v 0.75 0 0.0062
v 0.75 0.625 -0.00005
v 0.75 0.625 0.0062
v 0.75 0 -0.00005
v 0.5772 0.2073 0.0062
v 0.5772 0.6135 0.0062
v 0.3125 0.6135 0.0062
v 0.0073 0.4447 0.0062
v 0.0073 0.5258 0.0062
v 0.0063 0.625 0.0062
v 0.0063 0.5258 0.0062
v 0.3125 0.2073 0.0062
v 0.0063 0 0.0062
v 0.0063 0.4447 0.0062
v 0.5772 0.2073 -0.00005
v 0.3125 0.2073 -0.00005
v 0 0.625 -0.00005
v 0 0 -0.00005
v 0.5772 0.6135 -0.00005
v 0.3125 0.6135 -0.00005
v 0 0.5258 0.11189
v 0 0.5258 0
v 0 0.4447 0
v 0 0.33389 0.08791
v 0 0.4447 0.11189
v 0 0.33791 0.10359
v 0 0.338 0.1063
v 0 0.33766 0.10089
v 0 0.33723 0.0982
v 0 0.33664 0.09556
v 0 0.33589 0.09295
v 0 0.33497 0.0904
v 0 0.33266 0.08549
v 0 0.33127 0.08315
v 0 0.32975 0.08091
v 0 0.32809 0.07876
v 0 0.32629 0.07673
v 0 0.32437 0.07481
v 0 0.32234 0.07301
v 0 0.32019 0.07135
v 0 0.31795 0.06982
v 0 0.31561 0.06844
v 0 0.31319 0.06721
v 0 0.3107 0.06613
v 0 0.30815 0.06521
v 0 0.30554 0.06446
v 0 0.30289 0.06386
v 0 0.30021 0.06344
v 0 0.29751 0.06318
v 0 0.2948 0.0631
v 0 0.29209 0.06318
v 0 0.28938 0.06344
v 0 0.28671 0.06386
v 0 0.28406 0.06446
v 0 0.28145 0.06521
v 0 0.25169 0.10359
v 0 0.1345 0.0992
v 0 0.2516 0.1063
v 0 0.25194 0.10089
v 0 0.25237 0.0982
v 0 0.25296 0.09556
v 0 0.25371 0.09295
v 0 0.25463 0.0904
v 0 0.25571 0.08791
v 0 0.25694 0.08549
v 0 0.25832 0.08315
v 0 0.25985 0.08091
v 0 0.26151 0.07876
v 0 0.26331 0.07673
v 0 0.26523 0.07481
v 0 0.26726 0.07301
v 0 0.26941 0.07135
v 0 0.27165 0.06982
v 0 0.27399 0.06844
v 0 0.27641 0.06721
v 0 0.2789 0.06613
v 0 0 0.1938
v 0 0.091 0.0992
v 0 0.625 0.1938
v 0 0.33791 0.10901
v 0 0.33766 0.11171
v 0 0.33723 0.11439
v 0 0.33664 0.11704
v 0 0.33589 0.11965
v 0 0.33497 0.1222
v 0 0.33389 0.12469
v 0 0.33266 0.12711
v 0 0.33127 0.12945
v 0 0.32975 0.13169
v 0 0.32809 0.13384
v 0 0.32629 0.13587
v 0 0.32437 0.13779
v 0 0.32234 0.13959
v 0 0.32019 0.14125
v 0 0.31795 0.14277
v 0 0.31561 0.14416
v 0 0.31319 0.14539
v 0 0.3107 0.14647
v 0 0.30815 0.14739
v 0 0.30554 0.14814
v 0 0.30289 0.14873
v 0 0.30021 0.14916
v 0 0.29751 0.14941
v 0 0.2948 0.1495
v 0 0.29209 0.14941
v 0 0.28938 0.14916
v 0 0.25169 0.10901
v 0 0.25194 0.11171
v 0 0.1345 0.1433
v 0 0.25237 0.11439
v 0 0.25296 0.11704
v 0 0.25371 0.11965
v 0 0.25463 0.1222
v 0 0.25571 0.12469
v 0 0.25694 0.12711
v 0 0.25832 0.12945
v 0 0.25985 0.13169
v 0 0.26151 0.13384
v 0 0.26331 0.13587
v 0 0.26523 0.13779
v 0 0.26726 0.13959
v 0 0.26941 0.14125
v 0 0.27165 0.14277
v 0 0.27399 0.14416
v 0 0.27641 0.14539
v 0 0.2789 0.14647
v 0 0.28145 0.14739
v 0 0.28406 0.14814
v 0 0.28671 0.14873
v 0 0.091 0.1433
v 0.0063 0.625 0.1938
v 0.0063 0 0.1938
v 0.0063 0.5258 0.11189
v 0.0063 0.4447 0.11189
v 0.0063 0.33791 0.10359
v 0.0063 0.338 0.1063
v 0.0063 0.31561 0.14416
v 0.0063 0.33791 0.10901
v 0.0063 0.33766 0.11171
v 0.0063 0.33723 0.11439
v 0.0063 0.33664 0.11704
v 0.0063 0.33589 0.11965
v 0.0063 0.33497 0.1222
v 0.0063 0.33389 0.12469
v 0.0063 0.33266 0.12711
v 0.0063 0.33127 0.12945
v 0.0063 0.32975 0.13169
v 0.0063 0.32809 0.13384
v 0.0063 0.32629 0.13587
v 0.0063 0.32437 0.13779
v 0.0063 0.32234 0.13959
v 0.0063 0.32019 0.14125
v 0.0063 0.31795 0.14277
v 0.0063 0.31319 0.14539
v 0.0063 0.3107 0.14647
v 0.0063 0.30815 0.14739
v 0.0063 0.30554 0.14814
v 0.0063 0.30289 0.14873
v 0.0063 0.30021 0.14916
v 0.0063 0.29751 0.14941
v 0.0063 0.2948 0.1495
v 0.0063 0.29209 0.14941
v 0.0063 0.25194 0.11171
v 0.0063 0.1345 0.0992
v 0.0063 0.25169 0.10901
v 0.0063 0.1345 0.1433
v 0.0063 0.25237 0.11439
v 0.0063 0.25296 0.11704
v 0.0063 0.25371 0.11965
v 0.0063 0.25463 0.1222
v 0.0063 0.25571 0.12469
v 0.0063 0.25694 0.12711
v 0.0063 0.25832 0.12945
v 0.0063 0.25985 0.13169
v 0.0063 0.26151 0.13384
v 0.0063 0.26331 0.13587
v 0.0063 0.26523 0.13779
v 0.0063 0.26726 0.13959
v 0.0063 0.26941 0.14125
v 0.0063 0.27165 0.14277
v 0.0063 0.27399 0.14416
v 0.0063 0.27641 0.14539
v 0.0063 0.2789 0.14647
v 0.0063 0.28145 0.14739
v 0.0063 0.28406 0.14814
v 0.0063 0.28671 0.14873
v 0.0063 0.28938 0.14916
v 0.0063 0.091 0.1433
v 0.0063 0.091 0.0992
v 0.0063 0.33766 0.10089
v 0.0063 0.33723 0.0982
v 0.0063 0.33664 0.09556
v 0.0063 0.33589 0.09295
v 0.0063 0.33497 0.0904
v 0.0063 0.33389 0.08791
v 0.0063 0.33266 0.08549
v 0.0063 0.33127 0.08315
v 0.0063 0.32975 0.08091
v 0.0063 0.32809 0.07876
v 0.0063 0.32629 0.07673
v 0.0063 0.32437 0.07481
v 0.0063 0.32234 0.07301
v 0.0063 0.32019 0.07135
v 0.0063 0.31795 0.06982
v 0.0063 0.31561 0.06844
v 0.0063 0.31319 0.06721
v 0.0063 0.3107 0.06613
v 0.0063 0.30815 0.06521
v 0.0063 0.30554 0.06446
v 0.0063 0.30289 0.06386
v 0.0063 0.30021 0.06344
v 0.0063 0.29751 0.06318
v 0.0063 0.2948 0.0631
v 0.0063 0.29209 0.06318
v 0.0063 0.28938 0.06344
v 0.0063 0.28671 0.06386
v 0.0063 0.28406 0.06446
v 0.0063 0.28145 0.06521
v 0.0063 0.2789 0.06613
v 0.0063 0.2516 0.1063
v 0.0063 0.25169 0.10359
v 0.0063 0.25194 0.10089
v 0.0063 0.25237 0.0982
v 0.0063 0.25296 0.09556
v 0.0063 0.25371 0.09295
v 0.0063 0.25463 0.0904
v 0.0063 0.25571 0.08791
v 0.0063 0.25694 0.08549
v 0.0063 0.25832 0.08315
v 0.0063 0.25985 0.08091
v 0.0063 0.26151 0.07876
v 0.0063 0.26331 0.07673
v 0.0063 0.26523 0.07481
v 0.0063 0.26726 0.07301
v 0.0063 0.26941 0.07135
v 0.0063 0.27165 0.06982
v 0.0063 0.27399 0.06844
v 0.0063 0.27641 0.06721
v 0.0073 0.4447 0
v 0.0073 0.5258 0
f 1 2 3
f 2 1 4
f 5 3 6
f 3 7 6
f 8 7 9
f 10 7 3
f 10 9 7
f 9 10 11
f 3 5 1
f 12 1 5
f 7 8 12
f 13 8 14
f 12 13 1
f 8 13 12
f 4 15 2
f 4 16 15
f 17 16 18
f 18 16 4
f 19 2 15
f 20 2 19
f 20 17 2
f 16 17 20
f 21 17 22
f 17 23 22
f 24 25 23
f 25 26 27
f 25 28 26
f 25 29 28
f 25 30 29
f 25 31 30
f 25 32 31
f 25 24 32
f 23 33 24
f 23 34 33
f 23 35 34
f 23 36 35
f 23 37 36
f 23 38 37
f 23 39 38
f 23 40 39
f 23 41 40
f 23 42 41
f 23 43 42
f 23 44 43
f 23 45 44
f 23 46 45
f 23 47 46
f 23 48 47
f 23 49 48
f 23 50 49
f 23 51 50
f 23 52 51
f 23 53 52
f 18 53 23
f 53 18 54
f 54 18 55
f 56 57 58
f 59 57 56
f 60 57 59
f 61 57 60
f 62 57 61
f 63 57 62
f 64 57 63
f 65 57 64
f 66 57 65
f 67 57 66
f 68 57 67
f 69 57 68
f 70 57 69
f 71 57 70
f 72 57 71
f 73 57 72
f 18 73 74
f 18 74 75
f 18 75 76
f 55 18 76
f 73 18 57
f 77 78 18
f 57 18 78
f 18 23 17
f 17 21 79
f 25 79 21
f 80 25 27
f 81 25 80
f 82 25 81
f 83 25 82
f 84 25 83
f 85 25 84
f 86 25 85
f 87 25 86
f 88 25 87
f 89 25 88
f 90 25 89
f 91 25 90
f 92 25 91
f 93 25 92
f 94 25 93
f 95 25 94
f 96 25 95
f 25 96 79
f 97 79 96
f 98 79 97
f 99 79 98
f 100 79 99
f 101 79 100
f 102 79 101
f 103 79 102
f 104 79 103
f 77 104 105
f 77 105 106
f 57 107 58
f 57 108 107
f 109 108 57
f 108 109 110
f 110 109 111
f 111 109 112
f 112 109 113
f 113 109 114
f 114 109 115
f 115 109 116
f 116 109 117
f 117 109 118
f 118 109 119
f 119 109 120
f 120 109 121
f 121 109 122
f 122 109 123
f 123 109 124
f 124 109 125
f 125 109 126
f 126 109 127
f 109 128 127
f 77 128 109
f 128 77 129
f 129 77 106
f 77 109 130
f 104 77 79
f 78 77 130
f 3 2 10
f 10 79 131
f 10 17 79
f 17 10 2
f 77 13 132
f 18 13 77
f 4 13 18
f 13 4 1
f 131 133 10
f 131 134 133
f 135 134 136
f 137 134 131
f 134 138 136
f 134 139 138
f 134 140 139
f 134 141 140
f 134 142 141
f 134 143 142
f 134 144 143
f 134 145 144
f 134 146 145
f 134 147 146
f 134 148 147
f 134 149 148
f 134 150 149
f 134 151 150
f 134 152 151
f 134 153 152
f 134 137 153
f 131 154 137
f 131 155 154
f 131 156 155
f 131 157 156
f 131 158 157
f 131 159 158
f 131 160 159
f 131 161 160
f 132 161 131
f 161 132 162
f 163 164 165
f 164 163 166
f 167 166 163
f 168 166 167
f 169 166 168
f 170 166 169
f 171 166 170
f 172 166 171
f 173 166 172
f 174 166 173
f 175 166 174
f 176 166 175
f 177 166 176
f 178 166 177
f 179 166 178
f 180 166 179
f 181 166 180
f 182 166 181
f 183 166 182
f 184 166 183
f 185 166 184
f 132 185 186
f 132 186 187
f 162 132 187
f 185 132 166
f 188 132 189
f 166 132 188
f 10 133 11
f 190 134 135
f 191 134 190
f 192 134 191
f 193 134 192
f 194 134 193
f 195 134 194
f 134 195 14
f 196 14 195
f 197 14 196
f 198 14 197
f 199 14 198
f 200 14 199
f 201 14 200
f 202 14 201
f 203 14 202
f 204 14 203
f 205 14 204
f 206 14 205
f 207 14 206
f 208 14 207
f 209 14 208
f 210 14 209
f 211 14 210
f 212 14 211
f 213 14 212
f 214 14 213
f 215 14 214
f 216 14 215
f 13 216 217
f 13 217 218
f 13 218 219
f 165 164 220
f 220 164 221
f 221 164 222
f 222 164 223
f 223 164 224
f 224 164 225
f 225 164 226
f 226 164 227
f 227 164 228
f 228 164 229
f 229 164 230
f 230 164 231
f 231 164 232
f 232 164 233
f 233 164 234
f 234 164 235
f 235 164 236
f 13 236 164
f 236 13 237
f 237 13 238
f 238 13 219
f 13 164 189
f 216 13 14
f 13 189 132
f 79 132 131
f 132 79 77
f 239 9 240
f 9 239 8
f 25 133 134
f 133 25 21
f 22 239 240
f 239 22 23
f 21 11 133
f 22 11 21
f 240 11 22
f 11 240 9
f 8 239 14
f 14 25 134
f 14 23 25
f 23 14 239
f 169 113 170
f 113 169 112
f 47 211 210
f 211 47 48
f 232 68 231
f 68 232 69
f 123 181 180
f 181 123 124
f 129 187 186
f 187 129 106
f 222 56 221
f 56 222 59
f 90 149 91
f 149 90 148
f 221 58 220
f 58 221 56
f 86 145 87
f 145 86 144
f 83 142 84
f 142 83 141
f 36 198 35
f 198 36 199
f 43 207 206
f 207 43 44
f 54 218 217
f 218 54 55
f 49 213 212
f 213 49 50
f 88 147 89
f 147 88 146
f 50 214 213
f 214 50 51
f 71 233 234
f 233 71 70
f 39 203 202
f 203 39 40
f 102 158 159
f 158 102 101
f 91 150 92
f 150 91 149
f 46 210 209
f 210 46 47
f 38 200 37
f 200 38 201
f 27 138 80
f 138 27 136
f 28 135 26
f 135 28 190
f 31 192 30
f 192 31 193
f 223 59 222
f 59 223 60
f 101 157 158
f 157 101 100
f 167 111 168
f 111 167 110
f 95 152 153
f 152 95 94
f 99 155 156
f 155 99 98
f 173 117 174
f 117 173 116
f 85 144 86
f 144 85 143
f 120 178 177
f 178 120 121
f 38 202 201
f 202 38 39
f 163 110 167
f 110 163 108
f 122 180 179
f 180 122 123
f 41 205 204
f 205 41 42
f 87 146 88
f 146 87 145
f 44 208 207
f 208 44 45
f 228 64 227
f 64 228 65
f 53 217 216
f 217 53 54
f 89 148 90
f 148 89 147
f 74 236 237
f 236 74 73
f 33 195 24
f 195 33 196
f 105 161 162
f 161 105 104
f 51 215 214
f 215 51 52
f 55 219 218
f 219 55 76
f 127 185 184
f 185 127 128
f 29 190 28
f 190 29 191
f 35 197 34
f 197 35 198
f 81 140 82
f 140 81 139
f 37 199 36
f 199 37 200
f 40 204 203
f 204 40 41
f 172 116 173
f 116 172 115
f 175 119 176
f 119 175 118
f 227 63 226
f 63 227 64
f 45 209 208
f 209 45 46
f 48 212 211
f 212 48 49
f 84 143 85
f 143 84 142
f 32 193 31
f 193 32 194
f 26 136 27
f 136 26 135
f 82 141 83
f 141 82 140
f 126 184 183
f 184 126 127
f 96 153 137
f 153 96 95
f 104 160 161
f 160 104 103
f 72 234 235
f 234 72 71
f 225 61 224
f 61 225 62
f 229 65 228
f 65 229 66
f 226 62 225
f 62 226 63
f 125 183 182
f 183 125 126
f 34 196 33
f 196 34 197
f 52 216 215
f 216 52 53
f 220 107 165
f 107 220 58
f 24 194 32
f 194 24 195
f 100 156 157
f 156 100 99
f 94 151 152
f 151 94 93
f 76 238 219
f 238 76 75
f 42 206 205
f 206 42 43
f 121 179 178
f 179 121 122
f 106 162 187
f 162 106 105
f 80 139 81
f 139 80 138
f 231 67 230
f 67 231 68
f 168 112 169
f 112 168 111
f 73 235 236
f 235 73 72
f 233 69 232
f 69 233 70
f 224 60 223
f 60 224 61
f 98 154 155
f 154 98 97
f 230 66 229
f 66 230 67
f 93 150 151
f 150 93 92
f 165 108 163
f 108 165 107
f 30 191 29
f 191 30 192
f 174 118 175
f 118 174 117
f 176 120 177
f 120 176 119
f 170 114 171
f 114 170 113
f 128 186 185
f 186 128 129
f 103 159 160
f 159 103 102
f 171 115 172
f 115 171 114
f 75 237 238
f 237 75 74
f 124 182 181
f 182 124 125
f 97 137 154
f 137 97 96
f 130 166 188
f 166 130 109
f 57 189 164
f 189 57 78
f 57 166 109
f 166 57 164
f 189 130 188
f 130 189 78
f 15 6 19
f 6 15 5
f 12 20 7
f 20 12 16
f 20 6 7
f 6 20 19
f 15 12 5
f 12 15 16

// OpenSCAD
// Parameters
base_length = 0.75;
base_width = 0.625;
base_height = 0.00625;
base_elevation = 0.0062;

wall_thickness = 0.0063;
wall_height_above_plate = 0.1875;
wall_total_height = 0.1938;

// Wall cut parameters
lower_rect_cut_width = 0.081103;
lower_rect_cut_height = 0.111891;
lower_rect_front_offset = 0.4447;
lower_rect_back_offset = 0.0992;

// Circular hole parameters
hole_radius = 0.0432;
hole_front_offset = 0.2948;
hole_height_min = 0.0631;
hole_height_max = 0.1495;
hole_cut_reach = 0.0625;

// Small rectangular cut parameters
small_rect_width = 0.043521;
small_rect_height = 0.044108;
small_rect_front_offset = 0.091;
small_rect_back_offset = 0.4905;
small_rect_height_min = 0.0992;
small_rect_height_max = 0.1433;
small_rect_cut_reach = 0.0625;

// Base cut parameters
base_cut_width = 0.264669;
base_cut_depth = 0.40625;
base_cut_left_offset = 0.3125;
base_cut_right_offset = 0.1728;
base_cut_front_offset = 0.2073;
base_cut_back_offset = 0.0115;
base_cut_height_min = -0.0562;
base_cut_height_max = 0.0063;

$fn = 100;

// Main model
difference() {
    // Solid base and wall
    union() {
        // Main rectangular base
        translate([0, 0, base_elevation - base_height])
            cube([base_length, base_width, base_height]);
        
        // Upright wall along left edge
        translate([0, 0, 0])
            cube([wall_thickness, base_width, wall_total_height]);
    }
    
    // Cut lower rectangular opening through wall
    translate([0, lower_rect_front_offset, 0])
        cube([wall_thickness + 0.001, 
              base_width - lower_rect_front_offset - lower_rect_back_offset, 
              lower_rect_cut_height]);
    
    // Cut circular through-hole in wall
    translate([wall_thickness/2, hole_front_offset, (hole_height_min + hole_height_max)/2])
        rotate([0, 90, 0])
            cylinder(h = hole_cut_reach, r = hole_radius, center = true);
    
    // Cut smaller rectangular opening in wall
    translate([0, small_rect_front_offset, small_rect_height_min])
        cube([small_rect_cut_reach + 0.001, 
              base_width - small_rect_front_offset - small_rect_back_offset, 
              small_rect_height_max - small_rect_height_min]);
    
    // Cut rectangular through opening in base
    translate([base_cut_left_offset, base_cut_front_offset, base_cut_height_min])
        cube([base_length - base_cut_left_offset - base_cut_right_offset,
              base_width - base_cut_front_offset - base_cut_back_offset,
              base_cut_height_max - base_cut_height_min]);
}
